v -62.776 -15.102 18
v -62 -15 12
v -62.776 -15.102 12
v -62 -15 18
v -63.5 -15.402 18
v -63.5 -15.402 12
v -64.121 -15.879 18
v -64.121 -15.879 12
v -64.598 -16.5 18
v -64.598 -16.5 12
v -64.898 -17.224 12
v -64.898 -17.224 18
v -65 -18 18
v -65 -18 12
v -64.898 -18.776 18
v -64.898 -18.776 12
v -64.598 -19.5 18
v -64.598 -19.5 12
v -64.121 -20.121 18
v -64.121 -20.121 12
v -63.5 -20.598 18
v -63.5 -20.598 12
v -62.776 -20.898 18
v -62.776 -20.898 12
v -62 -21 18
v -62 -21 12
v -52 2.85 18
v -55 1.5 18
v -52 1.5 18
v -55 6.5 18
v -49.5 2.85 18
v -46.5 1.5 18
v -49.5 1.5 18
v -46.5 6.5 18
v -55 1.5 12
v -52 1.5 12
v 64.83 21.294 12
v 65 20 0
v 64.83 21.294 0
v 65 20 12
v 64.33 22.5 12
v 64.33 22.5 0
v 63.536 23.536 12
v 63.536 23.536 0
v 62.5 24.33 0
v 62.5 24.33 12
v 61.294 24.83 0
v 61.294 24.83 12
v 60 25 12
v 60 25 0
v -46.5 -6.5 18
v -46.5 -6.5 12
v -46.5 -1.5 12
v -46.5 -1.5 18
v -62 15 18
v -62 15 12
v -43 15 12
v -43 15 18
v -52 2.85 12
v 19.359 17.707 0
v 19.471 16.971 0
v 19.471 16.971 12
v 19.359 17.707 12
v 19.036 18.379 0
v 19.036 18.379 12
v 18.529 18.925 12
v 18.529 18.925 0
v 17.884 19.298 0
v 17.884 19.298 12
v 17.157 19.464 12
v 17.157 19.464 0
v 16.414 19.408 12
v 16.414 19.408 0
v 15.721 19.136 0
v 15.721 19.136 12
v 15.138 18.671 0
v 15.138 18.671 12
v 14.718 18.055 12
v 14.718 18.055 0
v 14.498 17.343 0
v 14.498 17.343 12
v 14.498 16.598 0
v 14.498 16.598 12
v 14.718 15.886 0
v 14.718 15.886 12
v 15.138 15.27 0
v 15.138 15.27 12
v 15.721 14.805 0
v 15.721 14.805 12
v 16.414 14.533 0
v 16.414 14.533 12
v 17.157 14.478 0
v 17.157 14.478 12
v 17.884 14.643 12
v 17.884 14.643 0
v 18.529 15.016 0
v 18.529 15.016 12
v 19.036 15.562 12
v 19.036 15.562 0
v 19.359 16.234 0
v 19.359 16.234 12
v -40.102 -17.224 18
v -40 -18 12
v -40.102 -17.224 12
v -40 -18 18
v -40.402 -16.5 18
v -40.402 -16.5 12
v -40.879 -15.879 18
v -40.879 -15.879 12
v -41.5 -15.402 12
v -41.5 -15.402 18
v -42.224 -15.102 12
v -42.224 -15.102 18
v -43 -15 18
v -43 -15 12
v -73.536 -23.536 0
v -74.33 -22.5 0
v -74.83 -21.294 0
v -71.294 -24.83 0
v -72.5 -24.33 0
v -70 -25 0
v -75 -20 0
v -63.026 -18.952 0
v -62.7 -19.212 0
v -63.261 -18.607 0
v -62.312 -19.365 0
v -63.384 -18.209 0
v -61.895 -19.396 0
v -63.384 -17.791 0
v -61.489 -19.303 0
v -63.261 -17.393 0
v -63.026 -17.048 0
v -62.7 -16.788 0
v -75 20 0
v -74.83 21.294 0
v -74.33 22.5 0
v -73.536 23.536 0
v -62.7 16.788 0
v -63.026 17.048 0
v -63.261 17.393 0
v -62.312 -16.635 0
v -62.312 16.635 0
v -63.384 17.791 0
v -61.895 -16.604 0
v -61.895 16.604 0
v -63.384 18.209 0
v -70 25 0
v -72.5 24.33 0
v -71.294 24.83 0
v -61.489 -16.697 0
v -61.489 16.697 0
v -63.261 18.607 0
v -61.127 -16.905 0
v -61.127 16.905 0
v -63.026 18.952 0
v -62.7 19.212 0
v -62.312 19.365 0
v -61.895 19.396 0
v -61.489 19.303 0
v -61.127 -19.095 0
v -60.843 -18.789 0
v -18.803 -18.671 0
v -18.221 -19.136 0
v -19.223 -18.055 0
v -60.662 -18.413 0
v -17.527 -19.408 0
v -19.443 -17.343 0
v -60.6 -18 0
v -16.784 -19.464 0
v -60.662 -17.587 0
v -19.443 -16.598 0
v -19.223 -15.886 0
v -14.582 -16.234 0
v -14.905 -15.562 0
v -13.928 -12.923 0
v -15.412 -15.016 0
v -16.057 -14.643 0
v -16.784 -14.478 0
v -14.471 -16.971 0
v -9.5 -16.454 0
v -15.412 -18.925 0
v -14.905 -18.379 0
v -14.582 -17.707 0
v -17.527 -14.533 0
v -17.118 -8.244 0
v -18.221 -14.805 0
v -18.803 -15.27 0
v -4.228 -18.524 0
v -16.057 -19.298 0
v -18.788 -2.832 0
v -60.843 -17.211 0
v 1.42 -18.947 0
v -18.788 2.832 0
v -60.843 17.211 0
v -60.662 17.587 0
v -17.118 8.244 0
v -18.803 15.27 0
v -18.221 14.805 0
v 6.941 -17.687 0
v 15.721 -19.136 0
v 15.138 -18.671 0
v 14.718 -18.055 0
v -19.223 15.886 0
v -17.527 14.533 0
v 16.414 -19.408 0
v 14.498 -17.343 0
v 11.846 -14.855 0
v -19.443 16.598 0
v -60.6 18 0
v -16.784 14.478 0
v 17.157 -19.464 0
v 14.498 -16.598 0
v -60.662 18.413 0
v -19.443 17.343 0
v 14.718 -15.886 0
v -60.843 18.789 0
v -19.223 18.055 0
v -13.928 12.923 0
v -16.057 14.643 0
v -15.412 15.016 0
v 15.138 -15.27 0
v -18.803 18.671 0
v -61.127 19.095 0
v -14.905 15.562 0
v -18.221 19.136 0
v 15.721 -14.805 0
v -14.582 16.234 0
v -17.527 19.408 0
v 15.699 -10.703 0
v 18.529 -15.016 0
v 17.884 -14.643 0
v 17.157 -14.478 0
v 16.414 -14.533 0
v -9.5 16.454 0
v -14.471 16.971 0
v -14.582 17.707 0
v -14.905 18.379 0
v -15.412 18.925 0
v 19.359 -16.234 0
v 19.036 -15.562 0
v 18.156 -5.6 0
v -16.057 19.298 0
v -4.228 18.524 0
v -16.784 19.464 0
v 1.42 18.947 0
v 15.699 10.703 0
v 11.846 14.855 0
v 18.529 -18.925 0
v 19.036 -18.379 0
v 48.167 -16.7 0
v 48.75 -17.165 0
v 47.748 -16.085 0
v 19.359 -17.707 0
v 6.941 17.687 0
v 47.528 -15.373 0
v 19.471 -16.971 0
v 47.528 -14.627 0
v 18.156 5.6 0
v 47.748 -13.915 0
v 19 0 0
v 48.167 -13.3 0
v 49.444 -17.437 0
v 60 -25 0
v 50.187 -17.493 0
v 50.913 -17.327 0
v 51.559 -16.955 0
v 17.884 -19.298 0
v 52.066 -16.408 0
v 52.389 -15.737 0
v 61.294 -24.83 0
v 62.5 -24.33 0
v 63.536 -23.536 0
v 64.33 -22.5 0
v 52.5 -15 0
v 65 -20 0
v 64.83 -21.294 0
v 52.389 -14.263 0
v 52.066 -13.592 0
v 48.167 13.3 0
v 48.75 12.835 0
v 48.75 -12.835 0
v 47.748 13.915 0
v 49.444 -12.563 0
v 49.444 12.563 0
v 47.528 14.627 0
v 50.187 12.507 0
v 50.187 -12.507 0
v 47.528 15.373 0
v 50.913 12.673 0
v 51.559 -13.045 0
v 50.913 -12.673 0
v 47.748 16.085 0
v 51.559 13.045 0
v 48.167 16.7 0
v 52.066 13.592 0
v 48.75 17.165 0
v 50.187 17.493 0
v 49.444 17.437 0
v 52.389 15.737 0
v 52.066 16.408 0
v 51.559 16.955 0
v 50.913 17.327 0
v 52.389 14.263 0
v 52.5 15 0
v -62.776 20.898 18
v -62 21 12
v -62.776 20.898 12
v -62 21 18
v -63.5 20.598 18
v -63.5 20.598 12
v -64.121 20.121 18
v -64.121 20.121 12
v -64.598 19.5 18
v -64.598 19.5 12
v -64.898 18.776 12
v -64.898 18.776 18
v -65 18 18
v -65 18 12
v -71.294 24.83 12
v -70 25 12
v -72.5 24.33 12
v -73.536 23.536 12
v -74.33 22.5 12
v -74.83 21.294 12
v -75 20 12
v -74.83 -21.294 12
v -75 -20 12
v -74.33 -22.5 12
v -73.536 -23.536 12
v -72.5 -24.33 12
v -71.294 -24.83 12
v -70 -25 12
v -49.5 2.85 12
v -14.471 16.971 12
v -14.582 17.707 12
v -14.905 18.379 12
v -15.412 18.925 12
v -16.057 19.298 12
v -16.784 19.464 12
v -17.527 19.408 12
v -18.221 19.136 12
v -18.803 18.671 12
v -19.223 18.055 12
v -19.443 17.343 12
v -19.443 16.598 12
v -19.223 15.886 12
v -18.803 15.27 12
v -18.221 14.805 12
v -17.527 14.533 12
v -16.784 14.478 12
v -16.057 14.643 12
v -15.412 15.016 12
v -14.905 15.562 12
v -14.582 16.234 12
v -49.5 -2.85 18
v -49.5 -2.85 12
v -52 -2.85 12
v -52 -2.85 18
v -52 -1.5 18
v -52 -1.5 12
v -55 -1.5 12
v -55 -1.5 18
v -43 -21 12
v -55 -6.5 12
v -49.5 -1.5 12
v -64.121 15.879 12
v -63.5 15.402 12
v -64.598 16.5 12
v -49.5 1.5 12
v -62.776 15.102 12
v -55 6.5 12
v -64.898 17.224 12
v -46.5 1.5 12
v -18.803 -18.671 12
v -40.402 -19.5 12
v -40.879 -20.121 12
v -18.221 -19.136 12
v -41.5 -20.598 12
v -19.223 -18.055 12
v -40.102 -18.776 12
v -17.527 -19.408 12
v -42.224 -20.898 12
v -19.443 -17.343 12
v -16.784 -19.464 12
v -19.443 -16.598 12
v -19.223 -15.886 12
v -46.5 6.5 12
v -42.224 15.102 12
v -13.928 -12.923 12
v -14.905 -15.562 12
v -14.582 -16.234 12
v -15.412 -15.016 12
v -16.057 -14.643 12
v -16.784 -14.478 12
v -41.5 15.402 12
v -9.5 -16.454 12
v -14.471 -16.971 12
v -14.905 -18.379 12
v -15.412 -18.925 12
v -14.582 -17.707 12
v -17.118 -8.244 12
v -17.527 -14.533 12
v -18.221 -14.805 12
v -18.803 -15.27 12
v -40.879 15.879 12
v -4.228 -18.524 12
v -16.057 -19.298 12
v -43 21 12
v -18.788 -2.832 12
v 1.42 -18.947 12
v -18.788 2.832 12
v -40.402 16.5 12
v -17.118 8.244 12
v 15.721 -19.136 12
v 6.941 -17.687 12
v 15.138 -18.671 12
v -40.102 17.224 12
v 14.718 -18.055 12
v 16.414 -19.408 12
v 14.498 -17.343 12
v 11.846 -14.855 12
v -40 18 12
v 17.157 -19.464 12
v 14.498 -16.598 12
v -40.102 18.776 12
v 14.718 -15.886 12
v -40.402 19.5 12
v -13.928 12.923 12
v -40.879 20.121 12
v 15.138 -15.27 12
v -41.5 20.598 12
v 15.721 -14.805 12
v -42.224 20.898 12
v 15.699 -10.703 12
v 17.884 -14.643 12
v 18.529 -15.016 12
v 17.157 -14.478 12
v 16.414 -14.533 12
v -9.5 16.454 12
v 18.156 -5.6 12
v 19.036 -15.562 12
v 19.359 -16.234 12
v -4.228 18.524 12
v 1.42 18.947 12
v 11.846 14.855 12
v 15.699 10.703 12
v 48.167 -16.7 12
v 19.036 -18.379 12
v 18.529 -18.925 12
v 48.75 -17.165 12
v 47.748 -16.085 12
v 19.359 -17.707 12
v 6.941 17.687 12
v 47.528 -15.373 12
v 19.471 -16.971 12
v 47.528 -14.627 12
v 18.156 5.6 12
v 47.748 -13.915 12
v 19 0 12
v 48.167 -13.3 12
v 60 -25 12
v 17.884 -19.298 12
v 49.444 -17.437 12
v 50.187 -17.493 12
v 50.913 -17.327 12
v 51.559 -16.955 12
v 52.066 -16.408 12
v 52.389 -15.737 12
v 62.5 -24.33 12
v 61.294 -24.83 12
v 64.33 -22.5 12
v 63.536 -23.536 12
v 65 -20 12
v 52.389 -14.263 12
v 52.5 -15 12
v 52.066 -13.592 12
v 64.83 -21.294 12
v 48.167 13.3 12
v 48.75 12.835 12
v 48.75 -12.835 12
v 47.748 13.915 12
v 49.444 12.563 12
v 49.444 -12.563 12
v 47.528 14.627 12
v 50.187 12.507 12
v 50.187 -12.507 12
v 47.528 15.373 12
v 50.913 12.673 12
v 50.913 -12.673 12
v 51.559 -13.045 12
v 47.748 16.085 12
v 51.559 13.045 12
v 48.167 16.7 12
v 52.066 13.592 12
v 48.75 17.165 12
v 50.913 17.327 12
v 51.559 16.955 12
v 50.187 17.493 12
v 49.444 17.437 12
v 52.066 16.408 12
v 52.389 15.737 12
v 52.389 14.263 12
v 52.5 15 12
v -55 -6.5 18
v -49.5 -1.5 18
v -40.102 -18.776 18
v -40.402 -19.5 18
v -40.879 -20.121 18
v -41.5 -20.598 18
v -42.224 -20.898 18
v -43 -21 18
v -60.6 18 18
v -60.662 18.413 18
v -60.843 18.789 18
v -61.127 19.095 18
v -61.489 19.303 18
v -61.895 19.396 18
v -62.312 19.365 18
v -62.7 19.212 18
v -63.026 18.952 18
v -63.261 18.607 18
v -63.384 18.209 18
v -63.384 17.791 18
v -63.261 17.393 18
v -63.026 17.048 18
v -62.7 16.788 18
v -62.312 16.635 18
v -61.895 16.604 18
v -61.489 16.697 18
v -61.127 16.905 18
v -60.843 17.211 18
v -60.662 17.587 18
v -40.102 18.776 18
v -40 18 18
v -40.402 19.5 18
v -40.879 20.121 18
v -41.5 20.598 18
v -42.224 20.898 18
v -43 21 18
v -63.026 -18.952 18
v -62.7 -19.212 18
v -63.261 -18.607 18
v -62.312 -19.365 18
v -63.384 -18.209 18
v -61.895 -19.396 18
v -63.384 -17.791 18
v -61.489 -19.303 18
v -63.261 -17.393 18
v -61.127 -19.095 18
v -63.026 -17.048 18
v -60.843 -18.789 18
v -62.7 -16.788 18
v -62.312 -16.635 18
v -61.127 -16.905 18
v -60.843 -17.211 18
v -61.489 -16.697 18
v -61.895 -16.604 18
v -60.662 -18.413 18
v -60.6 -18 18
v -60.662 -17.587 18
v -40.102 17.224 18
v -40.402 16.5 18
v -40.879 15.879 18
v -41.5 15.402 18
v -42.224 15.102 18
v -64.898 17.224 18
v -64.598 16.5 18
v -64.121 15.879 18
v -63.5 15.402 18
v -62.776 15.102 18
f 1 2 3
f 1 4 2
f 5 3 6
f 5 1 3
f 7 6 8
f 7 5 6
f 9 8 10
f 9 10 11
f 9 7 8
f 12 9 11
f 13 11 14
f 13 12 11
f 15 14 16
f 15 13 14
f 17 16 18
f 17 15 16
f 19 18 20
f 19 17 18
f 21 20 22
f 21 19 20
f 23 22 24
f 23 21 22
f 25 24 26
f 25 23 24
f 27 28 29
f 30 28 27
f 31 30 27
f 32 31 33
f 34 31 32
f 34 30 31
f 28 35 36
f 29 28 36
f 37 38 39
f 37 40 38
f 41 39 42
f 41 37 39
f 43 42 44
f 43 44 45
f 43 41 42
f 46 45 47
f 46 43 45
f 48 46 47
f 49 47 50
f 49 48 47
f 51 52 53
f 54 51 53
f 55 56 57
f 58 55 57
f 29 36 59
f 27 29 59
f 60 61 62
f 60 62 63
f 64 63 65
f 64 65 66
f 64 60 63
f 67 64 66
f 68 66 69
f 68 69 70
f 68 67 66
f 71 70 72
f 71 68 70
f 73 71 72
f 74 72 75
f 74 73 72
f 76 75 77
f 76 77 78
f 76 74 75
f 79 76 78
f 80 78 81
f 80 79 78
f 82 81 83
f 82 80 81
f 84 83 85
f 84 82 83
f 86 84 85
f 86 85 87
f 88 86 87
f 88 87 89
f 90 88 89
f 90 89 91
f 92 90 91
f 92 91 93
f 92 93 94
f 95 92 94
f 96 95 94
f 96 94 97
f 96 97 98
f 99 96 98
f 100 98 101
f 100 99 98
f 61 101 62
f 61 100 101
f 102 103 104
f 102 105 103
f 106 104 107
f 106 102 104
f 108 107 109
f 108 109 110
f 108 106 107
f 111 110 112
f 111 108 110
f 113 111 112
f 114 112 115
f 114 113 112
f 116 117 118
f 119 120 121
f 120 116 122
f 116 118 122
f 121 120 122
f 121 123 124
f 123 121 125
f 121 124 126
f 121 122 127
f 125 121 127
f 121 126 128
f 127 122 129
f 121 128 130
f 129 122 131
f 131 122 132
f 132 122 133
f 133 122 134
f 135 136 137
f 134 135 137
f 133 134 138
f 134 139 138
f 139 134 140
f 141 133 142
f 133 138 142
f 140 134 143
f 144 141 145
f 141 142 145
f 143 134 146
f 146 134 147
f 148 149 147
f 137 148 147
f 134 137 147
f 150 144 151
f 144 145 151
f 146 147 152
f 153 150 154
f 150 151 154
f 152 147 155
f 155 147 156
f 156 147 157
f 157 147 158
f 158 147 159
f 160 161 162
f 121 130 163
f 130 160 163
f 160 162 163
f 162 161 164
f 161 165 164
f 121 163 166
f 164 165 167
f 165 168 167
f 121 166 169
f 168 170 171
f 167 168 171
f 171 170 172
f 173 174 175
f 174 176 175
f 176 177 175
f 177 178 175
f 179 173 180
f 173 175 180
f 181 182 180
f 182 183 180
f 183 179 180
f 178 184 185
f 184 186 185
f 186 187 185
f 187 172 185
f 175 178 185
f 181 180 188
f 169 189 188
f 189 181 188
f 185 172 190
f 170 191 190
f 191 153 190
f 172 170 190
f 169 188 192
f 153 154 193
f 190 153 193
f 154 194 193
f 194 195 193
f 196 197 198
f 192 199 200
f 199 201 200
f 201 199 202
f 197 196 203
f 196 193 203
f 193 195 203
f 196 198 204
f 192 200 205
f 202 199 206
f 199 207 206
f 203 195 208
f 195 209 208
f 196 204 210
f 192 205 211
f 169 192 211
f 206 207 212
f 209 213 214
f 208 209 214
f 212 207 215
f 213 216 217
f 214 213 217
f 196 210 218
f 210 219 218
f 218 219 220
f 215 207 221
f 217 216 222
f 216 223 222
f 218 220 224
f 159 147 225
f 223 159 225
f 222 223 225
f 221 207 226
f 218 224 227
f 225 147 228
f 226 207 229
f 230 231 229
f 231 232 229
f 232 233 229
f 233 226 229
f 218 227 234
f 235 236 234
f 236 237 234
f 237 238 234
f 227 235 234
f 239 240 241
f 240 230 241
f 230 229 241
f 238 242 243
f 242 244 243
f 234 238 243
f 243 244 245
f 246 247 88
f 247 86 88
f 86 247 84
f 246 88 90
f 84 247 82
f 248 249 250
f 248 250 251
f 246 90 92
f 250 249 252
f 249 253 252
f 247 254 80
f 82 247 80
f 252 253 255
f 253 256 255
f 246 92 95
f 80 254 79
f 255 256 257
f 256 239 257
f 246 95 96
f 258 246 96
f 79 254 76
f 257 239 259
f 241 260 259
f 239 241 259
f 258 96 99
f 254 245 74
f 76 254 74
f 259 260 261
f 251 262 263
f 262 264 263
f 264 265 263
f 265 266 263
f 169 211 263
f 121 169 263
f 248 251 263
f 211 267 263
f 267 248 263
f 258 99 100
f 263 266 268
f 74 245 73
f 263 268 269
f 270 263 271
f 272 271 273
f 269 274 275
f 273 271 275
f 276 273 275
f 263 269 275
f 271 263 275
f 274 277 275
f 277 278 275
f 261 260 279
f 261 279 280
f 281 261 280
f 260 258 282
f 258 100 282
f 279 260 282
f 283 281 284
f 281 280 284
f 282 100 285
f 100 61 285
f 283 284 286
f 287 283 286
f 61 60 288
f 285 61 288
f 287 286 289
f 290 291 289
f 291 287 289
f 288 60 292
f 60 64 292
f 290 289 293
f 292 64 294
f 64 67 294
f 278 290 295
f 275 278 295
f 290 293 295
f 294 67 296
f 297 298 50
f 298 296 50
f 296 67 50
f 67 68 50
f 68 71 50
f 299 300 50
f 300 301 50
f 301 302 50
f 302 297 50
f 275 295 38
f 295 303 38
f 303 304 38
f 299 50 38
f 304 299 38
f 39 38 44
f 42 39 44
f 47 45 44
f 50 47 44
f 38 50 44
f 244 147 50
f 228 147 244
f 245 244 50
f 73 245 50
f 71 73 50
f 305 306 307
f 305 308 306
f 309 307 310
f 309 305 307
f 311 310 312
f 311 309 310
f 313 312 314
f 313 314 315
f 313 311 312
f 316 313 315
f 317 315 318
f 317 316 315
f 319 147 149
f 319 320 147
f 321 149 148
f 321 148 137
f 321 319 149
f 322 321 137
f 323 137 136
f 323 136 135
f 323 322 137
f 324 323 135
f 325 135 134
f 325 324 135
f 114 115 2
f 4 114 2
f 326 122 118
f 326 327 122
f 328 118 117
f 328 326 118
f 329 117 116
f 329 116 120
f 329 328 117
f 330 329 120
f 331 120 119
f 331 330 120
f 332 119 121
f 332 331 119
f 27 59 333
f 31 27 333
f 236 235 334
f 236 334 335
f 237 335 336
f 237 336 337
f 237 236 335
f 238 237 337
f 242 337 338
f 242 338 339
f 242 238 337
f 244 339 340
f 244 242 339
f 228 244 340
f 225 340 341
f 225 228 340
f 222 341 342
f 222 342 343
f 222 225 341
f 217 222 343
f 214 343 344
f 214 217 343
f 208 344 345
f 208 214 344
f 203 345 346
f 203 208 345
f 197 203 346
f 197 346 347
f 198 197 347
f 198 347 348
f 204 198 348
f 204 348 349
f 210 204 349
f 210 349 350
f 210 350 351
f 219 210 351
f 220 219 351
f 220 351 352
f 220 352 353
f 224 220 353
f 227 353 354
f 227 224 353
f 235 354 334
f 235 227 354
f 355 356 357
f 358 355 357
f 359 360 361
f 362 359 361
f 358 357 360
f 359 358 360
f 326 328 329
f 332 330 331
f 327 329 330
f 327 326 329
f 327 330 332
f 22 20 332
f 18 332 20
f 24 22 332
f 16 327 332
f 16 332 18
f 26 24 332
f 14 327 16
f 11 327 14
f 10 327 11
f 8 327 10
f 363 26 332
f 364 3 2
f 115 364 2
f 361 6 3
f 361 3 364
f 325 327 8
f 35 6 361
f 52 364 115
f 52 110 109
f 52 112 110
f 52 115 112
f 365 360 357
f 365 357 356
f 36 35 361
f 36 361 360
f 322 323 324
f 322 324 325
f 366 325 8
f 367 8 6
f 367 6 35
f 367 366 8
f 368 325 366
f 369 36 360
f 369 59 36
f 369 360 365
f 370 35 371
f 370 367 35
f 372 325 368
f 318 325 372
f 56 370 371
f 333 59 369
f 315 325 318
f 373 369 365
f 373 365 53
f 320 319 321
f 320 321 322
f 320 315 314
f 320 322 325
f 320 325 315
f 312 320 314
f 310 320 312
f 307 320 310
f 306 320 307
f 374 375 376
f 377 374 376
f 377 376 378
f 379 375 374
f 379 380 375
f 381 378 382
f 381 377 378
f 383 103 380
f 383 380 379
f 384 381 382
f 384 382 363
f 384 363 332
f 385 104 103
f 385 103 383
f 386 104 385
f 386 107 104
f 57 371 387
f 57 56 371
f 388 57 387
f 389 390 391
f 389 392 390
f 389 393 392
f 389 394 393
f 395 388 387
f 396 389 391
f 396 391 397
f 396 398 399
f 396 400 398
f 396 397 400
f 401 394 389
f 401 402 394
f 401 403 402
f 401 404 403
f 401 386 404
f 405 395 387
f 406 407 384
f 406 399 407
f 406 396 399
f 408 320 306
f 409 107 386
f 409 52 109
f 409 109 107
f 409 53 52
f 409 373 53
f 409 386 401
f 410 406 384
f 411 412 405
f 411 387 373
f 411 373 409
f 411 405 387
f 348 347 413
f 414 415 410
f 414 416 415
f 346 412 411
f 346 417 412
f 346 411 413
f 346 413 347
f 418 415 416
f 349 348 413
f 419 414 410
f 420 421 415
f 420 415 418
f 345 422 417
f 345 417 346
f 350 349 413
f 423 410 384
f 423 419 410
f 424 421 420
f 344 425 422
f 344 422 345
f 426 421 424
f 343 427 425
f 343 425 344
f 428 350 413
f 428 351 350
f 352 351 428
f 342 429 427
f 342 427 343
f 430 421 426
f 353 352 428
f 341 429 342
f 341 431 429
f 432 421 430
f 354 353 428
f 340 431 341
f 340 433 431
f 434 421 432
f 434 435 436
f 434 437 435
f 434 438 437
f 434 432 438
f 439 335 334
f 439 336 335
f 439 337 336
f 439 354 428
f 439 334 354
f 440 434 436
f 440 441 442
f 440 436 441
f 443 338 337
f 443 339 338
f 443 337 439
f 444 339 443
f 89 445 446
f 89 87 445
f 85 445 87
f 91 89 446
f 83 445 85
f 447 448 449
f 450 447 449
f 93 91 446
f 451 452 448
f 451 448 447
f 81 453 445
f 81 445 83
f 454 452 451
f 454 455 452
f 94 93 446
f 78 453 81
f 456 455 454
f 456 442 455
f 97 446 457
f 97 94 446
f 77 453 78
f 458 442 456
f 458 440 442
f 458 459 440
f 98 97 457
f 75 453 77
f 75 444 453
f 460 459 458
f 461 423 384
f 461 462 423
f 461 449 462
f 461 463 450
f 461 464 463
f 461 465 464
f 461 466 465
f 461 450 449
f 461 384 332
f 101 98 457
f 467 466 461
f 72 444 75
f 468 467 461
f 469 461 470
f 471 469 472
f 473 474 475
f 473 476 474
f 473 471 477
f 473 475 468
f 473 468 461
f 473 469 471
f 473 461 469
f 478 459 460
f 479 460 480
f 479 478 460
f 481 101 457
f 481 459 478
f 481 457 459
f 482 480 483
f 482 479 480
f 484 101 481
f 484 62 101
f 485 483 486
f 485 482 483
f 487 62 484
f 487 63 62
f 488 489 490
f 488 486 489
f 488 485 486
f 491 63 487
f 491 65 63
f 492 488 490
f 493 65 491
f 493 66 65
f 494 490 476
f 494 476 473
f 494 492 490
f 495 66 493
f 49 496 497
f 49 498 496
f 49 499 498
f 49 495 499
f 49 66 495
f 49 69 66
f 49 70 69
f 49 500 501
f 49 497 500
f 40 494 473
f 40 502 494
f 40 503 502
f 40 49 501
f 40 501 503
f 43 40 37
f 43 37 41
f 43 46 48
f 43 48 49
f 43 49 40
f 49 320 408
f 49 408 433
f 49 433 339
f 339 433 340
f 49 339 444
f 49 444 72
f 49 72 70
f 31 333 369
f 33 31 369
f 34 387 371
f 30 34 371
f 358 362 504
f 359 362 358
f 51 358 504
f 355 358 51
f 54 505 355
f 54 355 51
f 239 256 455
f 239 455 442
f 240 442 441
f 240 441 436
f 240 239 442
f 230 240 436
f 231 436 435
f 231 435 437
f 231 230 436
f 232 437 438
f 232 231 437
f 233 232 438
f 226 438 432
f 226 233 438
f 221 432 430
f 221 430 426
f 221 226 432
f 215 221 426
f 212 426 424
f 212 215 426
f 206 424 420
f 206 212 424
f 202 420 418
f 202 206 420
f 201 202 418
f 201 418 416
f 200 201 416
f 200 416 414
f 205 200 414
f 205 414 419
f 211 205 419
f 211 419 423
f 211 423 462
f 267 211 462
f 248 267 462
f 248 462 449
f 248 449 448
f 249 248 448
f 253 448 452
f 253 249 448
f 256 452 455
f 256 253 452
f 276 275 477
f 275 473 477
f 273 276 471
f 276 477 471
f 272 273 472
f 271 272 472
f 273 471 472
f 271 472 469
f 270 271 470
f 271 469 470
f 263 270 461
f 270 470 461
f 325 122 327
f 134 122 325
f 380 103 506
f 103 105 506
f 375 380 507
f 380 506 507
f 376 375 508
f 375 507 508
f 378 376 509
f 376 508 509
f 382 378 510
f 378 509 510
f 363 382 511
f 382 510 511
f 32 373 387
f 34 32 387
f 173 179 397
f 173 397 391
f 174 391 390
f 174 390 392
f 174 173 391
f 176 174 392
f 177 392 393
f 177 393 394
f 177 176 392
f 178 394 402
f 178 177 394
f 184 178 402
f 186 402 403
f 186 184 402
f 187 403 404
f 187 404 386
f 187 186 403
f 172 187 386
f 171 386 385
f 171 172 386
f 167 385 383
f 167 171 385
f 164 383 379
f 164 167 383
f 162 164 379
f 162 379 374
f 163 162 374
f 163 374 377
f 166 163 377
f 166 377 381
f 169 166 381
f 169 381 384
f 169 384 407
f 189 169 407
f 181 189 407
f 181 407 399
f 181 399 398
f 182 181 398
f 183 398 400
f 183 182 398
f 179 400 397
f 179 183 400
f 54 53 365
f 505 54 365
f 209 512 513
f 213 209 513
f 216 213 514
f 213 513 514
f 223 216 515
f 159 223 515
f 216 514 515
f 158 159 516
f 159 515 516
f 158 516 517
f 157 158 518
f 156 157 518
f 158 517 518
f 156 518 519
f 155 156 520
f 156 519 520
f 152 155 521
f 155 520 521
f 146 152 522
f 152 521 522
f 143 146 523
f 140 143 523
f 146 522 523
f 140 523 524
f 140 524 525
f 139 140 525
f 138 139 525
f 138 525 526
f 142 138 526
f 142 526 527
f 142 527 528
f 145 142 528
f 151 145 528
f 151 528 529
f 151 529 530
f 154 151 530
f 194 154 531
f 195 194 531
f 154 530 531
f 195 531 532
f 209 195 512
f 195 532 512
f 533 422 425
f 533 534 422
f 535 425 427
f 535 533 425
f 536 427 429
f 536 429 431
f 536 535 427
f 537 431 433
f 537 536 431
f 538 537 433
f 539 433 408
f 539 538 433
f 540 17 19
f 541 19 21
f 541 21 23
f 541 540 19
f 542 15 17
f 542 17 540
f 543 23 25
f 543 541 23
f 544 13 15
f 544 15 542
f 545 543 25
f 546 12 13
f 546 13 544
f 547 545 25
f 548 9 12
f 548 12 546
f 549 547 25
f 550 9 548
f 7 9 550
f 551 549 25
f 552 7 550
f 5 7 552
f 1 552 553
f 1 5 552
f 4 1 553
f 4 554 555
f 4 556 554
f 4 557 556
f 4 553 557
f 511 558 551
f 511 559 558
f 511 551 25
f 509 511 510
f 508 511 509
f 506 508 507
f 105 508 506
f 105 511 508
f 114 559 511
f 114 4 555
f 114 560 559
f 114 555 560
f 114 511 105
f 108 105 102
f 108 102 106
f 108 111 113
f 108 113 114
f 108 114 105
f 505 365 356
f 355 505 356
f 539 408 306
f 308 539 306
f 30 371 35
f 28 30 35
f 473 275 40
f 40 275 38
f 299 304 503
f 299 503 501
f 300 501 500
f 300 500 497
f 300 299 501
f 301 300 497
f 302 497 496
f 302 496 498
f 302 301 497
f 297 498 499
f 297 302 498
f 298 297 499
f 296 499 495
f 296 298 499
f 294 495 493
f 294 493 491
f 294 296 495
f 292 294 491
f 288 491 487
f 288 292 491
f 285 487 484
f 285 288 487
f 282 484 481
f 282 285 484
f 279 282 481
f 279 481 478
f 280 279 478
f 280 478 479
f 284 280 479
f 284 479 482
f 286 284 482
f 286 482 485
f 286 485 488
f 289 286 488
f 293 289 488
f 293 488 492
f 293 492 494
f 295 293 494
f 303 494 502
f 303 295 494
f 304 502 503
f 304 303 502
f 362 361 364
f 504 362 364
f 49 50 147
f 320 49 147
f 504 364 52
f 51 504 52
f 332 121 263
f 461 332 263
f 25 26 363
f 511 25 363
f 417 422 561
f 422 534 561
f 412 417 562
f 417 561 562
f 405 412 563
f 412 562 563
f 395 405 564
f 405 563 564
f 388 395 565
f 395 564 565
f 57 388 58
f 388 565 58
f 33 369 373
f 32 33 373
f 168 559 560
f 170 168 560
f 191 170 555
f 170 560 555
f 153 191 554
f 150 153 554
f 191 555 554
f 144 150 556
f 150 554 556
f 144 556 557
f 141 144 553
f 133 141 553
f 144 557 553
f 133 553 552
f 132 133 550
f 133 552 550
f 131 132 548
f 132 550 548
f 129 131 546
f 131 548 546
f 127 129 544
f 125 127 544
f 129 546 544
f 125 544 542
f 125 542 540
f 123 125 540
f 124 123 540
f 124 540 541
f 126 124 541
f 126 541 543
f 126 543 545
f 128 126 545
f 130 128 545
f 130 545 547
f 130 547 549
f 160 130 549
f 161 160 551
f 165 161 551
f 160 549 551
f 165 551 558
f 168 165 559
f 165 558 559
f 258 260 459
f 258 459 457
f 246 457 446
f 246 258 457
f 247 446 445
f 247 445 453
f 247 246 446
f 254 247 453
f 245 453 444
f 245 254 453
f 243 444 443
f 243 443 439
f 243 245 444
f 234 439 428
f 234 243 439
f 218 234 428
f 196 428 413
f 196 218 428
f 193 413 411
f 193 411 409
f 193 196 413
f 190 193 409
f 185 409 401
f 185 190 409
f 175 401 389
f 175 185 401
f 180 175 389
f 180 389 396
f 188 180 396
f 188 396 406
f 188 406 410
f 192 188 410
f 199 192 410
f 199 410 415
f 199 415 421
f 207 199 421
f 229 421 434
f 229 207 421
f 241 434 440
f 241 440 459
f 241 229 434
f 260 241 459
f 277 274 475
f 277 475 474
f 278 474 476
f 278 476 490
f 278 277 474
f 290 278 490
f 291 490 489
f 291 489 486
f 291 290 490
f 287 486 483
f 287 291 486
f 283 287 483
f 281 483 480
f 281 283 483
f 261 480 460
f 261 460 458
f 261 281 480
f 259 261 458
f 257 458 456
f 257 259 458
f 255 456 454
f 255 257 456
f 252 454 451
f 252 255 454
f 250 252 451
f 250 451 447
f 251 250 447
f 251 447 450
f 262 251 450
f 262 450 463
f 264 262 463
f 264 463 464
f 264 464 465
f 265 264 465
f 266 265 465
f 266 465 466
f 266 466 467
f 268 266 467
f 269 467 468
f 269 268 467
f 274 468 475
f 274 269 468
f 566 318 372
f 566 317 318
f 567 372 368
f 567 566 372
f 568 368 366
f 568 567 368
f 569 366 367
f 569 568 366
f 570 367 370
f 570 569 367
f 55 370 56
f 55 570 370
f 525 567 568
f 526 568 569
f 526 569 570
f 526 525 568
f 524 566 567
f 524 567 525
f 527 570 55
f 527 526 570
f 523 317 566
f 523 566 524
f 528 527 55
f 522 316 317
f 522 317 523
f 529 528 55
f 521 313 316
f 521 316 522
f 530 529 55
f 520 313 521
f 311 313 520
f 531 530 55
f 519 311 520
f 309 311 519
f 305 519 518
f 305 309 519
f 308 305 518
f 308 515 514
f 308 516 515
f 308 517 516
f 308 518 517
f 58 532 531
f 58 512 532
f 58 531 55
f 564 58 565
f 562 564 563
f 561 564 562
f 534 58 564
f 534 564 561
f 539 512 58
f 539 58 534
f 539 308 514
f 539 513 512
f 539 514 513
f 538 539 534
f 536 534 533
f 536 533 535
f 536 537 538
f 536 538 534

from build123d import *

# Parameters (mm, degrees)
F0_W     = 50
F0_H     = 50
F0_R     = 2.5
F0_R_2   = 19
F0_W_2   = 40
F1_DEPTH = 12
F2_R     = 5
F3_W     = 15
F3_H     = 6
F3_W_2   = 10
F4_DEPTH = 6
F5_R     = 2.99999
F6_R     = 1.4
F7_DEPTH = 18


# Not quite as in the source:
# - a fillet or chamfer is up to 0.001 mm smaller than in the source, because OpenCascade refuses the exact size


with BuildPart() as f1:
    # F0 (on Top) → F1 (new body)
    with BuildSketch(Plane.XY):
        Rectangle(F0_W, F0_H)
        with Locations((-16.9705627485, -16.9705627485)):
            Circle(F0_R, mode=Mode.SUBTRACT)
        with Locations((16.9705627485, -16.9705627485)):
            Circle(F0_R, mode=Mode.SUBTRACT)
        with Locations((-16.9705627485, 16.9705627485)):
            Circle(F0_R, mode=Mode.SUBTRACT)
        Circle(F0_R_2, mode=Mode.SUBTRACT)
        with Locations((16.9705627485, 16.9705627485)):
            Circle(F0_R, mode=Mode.SUBTRACT)
        with Locations((45, 0)):
            Rectangle(F0_W_2, F0_H)
        with Locations((50, -15)):
            Circle(F0_R, mode=Mode.SUBTRACT)
        with Locations((50, 15)):
            Circle(F0_R, mode=Mode.SUBTRACT)
        with Locations((-50, 0)):
            Rectangle(F0_W, F0_H)
    extrude(amount=F1_DEPTH)

    # F2
    f2_edges = [f1.edges().sort_by_distance(p)[0] for p in [
        (65, -25, 6),
        (65, 25, 6),
        (-75, -25, 6),
        (-75, 25, 6),
    ]]
    fillet(f2_edges, radius=F2_R)

    # F3 (on face) → F4 (join)
    with BuildSketch(Plane.XY.offset(12)):
        with Locations((-47.5, 18)):
            Rectangle(F3_W, F3_H)
        with Locations((-60, 18)):
            Rectangle(F3_W_2, F3_H)
        with Locations((-47.5, -18)):
            Rectangle(F3_W, F3_H)
        with Locations((-60, -18)):
            Rectangle(F3_W_2, F3_H)
        Polygon((-46.5, 6.5), (-55, 6.5), (-55, 1.5), (-52, 1.5), (-52, 2.85), (-49.5, 2.85), (-49.5, 1.5), (-46.5, 1.5), align=None)
        Polygon((-46.5, -6.5), (-46.5, -1.5), (-49.5, -1.5), (-49.5, -2.85), (-52, -2.85), (-52, -1.5), (-55, -1.5), (-55, -6.5), align=None)
    extrude(amount=F4_DEPTH)

    # F5 (radius 3 in the source; OpenCascade refuses exactly that, so slightly less here)
    f5_edges = [f1.edges().sort_by_distance(p)[0] for p in [
        (-65, 21, 15),
        (-65, 15, 15),
        (-40, 15, 15),
        (-65, -15, 15),
        (-65, -21, 15),
        (-40, -21, 15),
        (-40, -15, 15),
        (-40, 21, 15),
    ]]
    fillet(f5_edges, radius=F5_R)

    # F6 (on face) → F7 (cut, through all)
    with BuildSketch(Plane.XY.offset(18)):
        with Locations((-62, 18)):
            Circle(F6_R)
        with Locations((-62, -18)):
            Circle(F6_R)
    extrude(amount=-F7_DEPTH, mode=Mode.SUBTRACT)


solid = f1.part
